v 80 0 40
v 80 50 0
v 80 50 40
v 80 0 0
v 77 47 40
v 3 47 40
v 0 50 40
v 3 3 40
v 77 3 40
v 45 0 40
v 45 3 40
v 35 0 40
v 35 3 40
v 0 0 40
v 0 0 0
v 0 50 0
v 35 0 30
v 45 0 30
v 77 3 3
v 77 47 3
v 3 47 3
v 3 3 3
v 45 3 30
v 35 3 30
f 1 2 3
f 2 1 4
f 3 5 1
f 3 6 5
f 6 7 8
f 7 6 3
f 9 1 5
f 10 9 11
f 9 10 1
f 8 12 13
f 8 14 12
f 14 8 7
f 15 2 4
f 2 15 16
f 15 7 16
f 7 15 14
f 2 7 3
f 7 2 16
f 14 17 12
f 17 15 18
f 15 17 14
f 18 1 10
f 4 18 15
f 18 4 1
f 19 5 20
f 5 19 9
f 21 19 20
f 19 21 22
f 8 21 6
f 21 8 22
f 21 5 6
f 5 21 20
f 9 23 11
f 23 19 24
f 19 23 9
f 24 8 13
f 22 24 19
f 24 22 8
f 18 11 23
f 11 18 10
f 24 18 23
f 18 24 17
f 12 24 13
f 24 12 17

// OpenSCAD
$fn = 32;

// ----------------------------------------------------------------------
// Enclosure box: notch enclosure
// ----------------------------------------------------------------------

// --- parameters (mm) ---
box_l = 80;               // outer length, X
box_w = 50;               // outer width, Y
box_h = 40;               // outer height
wall_t = 3;               // wall thickness
notch_w = 10;             // cable notch width
notch_h = 10;             // cable notch height

inner_h = box_h - wall_t;  // cavity depth
boss_h = inner_h - 2;  // corner boss height

difference() {
  union() {
    difference() {
      cube([box_l, box_w, box_h]);
      translate([wall_t, wall_t, wall_t])
        cube([box_l - 2 * wall_t, box_w - 2 * wall_t, box_h]);
    }
  }
  translate([box_l / 2 - notch_w / 2, -1, box_h - notch_h])
    cube([notch_w, wall_t + 2, notch_h + 1]);
}
